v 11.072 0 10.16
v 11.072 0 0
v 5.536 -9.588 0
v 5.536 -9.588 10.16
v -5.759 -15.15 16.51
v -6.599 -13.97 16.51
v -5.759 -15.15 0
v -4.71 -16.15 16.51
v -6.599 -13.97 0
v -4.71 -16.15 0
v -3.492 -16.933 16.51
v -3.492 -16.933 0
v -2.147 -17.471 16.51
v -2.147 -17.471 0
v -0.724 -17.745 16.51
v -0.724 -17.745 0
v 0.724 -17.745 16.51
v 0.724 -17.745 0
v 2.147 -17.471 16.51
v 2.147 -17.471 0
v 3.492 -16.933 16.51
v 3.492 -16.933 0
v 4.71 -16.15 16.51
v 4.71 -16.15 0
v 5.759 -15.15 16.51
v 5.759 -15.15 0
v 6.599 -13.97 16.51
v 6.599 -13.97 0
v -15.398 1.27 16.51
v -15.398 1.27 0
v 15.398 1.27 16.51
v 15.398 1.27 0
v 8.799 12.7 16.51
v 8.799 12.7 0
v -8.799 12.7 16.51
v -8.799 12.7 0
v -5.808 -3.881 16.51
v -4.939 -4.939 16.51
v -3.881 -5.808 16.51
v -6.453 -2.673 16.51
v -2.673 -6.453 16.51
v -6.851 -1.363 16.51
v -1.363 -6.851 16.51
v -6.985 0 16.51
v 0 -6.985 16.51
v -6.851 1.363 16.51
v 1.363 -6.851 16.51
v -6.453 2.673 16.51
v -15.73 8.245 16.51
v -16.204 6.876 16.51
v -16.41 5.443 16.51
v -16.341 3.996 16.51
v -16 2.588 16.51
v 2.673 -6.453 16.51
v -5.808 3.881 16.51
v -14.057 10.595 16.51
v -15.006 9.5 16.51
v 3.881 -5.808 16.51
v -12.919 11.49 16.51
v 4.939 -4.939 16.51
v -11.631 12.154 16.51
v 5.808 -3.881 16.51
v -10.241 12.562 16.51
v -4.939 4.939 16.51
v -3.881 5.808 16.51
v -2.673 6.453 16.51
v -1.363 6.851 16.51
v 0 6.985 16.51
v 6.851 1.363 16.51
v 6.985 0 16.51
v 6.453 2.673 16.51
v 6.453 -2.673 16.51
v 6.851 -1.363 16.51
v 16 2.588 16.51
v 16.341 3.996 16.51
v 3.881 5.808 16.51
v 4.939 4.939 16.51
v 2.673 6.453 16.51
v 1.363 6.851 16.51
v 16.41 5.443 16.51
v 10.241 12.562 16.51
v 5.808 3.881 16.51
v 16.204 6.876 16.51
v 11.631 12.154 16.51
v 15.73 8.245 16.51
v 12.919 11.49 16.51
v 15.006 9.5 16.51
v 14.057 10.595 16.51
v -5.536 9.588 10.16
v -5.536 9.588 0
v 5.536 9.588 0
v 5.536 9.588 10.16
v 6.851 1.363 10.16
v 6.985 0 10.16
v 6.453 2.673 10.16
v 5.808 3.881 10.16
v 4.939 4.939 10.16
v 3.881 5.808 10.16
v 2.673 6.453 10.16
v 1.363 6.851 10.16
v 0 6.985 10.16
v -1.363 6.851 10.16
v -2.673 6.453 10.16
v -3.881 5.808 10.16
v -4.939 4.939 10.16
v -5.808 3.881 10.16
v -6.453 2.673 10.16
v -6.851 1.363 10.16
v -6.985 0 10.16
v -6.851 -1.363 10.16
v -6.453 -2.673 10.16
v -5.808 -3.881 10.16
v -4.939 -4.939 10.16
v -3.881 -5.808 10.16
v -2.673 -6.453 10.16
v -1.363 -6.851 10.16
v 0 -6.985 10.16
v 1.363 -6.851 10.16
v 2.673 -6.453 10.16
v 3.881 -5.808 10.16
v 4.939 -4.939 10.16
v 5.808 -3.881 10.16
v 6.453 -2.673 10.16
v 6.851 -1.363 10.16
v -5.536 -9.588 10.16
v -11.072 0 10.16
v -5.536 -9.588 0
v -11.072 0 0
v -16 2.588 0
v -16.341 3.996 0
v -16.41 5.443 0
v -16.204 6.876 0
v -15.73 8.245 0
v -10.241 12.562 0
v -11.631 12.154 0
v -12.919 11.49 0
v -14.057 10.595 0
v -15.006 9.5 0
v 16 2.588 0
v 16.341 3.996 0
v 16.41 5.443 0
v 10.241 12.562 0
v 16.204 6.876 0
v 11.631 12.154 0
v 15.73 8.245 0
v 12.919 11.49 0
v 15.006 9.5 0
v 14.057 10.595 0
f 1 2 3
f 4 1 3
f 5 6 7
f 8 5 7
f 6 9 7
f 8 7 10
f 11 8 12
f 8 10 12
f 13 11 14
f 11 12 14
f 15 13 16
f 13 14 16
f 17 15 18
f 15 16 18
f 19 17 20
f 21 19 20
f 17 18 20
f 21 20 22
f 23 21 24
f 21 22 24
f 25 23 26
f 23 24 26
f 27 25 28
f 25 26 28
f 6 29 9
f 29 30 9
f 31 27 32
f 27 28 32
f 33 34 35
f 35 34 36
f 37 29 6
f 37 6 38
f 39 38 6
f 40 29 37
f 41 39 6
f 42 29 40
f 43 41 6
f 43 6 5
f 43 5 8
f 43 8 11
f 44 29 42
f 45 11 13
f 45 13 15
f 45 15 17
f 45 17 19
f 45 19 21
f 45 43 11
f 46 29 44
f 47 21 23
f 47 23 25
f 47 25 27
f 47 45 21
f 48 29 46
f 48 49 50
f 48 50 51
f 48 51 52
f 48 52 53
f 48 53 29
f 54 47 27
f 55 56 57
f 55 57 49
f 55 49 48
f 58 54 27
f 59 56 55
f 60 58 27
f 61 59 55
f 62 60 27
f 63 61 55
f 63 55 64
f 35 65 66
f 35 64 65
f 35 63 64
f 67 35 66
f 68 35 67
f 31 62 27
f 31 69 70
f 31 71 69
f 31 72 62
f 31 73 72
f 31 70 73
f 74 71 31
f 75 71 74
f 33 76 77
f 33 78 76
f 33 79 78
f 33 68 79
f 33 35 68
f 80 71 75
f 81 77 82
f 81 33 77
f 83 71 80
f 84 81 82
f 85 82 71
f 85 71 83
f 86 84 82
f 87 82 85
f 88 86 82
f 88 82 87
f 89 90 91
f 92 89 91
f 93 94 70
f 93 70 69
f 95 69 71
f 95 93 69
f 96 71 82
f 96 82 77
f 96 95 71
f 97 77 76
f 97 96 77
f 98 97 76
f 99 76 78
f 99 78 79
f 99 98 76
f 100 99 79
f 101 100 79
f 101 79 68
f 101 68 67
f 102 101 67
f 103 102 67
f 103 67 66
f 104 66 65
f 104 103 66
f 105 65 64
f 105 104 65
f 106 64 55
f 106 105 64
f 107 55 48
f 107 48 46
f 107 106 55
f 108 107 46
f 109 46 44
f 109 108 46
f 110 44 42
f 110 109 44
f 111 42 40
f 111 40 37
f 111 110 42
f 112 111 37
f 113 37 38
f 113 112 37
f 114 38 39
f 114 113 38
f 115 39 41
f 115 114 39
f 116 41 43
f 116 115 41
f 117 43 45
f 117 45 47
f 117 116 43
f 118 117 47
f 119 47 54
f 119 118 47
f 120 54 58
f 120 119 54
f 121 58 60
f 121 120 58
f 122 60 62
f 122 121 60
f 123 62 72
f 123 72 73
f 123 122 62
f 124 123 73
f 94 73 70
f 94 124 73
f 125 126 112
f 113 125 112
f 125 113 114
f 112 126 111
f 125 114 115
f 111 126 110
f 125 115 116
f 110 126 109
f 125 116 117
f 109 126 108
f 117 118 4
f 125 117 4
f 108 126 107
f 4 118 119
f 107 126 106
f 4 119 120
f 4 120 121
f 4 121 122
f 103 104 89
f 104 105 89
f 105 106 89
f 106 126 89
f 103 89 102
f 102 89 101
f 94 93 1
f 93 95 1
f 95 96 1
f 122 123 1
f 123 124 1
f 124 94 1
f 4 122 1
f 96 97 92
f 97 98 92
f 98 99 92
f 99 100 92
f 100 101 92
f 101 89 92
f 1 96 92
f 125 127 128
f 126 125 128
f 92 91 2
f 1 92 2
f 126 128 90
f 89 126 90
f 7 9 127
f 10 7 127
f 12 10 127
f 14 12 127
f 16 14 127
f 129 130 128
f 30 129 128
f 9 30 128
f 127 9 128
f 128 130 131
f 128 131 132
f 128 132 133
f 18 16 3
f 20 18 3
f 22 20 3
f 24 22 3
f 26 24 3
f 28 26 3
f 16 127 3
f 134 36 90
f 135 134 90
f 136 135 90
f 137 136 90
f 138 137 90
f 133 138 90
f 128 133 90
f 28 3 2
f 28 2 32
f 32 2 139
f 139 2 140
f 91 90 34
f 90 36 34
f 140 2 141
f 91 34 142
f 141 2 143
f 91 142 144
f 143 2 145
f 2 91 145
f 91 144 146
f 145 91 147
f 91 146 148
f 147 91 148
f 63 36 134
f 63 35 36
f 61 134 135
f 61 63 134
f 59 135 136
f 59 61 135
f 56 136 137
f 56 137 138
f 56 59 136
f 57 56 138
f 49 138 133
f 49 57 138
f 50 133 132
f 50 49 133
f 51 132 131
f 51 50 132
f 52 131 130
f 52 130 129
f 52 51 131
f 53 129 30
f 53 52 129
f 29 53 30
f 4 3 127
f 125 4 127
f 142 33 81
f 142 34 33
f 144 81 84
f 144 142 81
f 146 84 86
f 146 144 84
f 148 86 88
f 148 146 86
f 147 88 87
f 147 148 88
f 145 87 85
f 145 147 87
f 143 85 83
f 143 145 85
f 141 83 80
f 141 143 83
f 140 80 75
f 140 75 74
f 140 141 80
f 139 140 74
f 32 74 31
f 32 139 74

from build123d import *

# Parameters (mm, degrees)
F1_DEPTH = 10.16
F2_R     = 6.985
F3_DEPTH = 6.35
F4_R     = 7.62


with BuildPart() as f1:
    # F0 (on Top) → F1 (new body)
    with BuildSketch(Plane.XY):
        Polygon((21.997045, 12.7), (-21.997045, 12.7), (0, -25.4), align=None)
        Polygon((-11.071846, 0), (-5.535923, 9.5885), (5.535923, 9.5885), (11.071846, 0), (5.535923, -9.5885), (-5.535923, -9.5885), align=None, mode=Mode.SUBTRACT)
    extrude(amount=F1_DEPTH)

    # F2 (on face) → F3 (join)
    with BuildSketch(Plane.XY.offset(10.16)):
        Polygon((21.997045, 12.7), (-21.997045, 12.7), (0, -25.4), align=None)
        Polygon((-5.535923, -9.5885), (-11.071846, 0), (-5.535923, 9.5885), (5.535923, 9.5885), (11.071846, 0), (5.535923, -9.5885), align=None, mode=Mode.SUBTRACT)
        Polygon((-5.535923, 9.5885), (-11.071846, 0), (-5.535923, -9.5885), (5.535923, -9.5885), (11.071846, 0), (5.535923, 9.5885), align=None)
        Circle(F2_R, mode=Mode.SUBTRACT)
    extrude(amount=F3_DEPTH)

    # F4
    f4_edges = [f1.edges().sort_by_distance(p)[0] for p in [
        (-21.997045, 12.7, 8.255),
        (21.997045, 12.7, 8.255),
        (0, -25.4, 8.255),
    ]]
    fillet(f4_edges, radius=F4_R)


solid = f1.part
